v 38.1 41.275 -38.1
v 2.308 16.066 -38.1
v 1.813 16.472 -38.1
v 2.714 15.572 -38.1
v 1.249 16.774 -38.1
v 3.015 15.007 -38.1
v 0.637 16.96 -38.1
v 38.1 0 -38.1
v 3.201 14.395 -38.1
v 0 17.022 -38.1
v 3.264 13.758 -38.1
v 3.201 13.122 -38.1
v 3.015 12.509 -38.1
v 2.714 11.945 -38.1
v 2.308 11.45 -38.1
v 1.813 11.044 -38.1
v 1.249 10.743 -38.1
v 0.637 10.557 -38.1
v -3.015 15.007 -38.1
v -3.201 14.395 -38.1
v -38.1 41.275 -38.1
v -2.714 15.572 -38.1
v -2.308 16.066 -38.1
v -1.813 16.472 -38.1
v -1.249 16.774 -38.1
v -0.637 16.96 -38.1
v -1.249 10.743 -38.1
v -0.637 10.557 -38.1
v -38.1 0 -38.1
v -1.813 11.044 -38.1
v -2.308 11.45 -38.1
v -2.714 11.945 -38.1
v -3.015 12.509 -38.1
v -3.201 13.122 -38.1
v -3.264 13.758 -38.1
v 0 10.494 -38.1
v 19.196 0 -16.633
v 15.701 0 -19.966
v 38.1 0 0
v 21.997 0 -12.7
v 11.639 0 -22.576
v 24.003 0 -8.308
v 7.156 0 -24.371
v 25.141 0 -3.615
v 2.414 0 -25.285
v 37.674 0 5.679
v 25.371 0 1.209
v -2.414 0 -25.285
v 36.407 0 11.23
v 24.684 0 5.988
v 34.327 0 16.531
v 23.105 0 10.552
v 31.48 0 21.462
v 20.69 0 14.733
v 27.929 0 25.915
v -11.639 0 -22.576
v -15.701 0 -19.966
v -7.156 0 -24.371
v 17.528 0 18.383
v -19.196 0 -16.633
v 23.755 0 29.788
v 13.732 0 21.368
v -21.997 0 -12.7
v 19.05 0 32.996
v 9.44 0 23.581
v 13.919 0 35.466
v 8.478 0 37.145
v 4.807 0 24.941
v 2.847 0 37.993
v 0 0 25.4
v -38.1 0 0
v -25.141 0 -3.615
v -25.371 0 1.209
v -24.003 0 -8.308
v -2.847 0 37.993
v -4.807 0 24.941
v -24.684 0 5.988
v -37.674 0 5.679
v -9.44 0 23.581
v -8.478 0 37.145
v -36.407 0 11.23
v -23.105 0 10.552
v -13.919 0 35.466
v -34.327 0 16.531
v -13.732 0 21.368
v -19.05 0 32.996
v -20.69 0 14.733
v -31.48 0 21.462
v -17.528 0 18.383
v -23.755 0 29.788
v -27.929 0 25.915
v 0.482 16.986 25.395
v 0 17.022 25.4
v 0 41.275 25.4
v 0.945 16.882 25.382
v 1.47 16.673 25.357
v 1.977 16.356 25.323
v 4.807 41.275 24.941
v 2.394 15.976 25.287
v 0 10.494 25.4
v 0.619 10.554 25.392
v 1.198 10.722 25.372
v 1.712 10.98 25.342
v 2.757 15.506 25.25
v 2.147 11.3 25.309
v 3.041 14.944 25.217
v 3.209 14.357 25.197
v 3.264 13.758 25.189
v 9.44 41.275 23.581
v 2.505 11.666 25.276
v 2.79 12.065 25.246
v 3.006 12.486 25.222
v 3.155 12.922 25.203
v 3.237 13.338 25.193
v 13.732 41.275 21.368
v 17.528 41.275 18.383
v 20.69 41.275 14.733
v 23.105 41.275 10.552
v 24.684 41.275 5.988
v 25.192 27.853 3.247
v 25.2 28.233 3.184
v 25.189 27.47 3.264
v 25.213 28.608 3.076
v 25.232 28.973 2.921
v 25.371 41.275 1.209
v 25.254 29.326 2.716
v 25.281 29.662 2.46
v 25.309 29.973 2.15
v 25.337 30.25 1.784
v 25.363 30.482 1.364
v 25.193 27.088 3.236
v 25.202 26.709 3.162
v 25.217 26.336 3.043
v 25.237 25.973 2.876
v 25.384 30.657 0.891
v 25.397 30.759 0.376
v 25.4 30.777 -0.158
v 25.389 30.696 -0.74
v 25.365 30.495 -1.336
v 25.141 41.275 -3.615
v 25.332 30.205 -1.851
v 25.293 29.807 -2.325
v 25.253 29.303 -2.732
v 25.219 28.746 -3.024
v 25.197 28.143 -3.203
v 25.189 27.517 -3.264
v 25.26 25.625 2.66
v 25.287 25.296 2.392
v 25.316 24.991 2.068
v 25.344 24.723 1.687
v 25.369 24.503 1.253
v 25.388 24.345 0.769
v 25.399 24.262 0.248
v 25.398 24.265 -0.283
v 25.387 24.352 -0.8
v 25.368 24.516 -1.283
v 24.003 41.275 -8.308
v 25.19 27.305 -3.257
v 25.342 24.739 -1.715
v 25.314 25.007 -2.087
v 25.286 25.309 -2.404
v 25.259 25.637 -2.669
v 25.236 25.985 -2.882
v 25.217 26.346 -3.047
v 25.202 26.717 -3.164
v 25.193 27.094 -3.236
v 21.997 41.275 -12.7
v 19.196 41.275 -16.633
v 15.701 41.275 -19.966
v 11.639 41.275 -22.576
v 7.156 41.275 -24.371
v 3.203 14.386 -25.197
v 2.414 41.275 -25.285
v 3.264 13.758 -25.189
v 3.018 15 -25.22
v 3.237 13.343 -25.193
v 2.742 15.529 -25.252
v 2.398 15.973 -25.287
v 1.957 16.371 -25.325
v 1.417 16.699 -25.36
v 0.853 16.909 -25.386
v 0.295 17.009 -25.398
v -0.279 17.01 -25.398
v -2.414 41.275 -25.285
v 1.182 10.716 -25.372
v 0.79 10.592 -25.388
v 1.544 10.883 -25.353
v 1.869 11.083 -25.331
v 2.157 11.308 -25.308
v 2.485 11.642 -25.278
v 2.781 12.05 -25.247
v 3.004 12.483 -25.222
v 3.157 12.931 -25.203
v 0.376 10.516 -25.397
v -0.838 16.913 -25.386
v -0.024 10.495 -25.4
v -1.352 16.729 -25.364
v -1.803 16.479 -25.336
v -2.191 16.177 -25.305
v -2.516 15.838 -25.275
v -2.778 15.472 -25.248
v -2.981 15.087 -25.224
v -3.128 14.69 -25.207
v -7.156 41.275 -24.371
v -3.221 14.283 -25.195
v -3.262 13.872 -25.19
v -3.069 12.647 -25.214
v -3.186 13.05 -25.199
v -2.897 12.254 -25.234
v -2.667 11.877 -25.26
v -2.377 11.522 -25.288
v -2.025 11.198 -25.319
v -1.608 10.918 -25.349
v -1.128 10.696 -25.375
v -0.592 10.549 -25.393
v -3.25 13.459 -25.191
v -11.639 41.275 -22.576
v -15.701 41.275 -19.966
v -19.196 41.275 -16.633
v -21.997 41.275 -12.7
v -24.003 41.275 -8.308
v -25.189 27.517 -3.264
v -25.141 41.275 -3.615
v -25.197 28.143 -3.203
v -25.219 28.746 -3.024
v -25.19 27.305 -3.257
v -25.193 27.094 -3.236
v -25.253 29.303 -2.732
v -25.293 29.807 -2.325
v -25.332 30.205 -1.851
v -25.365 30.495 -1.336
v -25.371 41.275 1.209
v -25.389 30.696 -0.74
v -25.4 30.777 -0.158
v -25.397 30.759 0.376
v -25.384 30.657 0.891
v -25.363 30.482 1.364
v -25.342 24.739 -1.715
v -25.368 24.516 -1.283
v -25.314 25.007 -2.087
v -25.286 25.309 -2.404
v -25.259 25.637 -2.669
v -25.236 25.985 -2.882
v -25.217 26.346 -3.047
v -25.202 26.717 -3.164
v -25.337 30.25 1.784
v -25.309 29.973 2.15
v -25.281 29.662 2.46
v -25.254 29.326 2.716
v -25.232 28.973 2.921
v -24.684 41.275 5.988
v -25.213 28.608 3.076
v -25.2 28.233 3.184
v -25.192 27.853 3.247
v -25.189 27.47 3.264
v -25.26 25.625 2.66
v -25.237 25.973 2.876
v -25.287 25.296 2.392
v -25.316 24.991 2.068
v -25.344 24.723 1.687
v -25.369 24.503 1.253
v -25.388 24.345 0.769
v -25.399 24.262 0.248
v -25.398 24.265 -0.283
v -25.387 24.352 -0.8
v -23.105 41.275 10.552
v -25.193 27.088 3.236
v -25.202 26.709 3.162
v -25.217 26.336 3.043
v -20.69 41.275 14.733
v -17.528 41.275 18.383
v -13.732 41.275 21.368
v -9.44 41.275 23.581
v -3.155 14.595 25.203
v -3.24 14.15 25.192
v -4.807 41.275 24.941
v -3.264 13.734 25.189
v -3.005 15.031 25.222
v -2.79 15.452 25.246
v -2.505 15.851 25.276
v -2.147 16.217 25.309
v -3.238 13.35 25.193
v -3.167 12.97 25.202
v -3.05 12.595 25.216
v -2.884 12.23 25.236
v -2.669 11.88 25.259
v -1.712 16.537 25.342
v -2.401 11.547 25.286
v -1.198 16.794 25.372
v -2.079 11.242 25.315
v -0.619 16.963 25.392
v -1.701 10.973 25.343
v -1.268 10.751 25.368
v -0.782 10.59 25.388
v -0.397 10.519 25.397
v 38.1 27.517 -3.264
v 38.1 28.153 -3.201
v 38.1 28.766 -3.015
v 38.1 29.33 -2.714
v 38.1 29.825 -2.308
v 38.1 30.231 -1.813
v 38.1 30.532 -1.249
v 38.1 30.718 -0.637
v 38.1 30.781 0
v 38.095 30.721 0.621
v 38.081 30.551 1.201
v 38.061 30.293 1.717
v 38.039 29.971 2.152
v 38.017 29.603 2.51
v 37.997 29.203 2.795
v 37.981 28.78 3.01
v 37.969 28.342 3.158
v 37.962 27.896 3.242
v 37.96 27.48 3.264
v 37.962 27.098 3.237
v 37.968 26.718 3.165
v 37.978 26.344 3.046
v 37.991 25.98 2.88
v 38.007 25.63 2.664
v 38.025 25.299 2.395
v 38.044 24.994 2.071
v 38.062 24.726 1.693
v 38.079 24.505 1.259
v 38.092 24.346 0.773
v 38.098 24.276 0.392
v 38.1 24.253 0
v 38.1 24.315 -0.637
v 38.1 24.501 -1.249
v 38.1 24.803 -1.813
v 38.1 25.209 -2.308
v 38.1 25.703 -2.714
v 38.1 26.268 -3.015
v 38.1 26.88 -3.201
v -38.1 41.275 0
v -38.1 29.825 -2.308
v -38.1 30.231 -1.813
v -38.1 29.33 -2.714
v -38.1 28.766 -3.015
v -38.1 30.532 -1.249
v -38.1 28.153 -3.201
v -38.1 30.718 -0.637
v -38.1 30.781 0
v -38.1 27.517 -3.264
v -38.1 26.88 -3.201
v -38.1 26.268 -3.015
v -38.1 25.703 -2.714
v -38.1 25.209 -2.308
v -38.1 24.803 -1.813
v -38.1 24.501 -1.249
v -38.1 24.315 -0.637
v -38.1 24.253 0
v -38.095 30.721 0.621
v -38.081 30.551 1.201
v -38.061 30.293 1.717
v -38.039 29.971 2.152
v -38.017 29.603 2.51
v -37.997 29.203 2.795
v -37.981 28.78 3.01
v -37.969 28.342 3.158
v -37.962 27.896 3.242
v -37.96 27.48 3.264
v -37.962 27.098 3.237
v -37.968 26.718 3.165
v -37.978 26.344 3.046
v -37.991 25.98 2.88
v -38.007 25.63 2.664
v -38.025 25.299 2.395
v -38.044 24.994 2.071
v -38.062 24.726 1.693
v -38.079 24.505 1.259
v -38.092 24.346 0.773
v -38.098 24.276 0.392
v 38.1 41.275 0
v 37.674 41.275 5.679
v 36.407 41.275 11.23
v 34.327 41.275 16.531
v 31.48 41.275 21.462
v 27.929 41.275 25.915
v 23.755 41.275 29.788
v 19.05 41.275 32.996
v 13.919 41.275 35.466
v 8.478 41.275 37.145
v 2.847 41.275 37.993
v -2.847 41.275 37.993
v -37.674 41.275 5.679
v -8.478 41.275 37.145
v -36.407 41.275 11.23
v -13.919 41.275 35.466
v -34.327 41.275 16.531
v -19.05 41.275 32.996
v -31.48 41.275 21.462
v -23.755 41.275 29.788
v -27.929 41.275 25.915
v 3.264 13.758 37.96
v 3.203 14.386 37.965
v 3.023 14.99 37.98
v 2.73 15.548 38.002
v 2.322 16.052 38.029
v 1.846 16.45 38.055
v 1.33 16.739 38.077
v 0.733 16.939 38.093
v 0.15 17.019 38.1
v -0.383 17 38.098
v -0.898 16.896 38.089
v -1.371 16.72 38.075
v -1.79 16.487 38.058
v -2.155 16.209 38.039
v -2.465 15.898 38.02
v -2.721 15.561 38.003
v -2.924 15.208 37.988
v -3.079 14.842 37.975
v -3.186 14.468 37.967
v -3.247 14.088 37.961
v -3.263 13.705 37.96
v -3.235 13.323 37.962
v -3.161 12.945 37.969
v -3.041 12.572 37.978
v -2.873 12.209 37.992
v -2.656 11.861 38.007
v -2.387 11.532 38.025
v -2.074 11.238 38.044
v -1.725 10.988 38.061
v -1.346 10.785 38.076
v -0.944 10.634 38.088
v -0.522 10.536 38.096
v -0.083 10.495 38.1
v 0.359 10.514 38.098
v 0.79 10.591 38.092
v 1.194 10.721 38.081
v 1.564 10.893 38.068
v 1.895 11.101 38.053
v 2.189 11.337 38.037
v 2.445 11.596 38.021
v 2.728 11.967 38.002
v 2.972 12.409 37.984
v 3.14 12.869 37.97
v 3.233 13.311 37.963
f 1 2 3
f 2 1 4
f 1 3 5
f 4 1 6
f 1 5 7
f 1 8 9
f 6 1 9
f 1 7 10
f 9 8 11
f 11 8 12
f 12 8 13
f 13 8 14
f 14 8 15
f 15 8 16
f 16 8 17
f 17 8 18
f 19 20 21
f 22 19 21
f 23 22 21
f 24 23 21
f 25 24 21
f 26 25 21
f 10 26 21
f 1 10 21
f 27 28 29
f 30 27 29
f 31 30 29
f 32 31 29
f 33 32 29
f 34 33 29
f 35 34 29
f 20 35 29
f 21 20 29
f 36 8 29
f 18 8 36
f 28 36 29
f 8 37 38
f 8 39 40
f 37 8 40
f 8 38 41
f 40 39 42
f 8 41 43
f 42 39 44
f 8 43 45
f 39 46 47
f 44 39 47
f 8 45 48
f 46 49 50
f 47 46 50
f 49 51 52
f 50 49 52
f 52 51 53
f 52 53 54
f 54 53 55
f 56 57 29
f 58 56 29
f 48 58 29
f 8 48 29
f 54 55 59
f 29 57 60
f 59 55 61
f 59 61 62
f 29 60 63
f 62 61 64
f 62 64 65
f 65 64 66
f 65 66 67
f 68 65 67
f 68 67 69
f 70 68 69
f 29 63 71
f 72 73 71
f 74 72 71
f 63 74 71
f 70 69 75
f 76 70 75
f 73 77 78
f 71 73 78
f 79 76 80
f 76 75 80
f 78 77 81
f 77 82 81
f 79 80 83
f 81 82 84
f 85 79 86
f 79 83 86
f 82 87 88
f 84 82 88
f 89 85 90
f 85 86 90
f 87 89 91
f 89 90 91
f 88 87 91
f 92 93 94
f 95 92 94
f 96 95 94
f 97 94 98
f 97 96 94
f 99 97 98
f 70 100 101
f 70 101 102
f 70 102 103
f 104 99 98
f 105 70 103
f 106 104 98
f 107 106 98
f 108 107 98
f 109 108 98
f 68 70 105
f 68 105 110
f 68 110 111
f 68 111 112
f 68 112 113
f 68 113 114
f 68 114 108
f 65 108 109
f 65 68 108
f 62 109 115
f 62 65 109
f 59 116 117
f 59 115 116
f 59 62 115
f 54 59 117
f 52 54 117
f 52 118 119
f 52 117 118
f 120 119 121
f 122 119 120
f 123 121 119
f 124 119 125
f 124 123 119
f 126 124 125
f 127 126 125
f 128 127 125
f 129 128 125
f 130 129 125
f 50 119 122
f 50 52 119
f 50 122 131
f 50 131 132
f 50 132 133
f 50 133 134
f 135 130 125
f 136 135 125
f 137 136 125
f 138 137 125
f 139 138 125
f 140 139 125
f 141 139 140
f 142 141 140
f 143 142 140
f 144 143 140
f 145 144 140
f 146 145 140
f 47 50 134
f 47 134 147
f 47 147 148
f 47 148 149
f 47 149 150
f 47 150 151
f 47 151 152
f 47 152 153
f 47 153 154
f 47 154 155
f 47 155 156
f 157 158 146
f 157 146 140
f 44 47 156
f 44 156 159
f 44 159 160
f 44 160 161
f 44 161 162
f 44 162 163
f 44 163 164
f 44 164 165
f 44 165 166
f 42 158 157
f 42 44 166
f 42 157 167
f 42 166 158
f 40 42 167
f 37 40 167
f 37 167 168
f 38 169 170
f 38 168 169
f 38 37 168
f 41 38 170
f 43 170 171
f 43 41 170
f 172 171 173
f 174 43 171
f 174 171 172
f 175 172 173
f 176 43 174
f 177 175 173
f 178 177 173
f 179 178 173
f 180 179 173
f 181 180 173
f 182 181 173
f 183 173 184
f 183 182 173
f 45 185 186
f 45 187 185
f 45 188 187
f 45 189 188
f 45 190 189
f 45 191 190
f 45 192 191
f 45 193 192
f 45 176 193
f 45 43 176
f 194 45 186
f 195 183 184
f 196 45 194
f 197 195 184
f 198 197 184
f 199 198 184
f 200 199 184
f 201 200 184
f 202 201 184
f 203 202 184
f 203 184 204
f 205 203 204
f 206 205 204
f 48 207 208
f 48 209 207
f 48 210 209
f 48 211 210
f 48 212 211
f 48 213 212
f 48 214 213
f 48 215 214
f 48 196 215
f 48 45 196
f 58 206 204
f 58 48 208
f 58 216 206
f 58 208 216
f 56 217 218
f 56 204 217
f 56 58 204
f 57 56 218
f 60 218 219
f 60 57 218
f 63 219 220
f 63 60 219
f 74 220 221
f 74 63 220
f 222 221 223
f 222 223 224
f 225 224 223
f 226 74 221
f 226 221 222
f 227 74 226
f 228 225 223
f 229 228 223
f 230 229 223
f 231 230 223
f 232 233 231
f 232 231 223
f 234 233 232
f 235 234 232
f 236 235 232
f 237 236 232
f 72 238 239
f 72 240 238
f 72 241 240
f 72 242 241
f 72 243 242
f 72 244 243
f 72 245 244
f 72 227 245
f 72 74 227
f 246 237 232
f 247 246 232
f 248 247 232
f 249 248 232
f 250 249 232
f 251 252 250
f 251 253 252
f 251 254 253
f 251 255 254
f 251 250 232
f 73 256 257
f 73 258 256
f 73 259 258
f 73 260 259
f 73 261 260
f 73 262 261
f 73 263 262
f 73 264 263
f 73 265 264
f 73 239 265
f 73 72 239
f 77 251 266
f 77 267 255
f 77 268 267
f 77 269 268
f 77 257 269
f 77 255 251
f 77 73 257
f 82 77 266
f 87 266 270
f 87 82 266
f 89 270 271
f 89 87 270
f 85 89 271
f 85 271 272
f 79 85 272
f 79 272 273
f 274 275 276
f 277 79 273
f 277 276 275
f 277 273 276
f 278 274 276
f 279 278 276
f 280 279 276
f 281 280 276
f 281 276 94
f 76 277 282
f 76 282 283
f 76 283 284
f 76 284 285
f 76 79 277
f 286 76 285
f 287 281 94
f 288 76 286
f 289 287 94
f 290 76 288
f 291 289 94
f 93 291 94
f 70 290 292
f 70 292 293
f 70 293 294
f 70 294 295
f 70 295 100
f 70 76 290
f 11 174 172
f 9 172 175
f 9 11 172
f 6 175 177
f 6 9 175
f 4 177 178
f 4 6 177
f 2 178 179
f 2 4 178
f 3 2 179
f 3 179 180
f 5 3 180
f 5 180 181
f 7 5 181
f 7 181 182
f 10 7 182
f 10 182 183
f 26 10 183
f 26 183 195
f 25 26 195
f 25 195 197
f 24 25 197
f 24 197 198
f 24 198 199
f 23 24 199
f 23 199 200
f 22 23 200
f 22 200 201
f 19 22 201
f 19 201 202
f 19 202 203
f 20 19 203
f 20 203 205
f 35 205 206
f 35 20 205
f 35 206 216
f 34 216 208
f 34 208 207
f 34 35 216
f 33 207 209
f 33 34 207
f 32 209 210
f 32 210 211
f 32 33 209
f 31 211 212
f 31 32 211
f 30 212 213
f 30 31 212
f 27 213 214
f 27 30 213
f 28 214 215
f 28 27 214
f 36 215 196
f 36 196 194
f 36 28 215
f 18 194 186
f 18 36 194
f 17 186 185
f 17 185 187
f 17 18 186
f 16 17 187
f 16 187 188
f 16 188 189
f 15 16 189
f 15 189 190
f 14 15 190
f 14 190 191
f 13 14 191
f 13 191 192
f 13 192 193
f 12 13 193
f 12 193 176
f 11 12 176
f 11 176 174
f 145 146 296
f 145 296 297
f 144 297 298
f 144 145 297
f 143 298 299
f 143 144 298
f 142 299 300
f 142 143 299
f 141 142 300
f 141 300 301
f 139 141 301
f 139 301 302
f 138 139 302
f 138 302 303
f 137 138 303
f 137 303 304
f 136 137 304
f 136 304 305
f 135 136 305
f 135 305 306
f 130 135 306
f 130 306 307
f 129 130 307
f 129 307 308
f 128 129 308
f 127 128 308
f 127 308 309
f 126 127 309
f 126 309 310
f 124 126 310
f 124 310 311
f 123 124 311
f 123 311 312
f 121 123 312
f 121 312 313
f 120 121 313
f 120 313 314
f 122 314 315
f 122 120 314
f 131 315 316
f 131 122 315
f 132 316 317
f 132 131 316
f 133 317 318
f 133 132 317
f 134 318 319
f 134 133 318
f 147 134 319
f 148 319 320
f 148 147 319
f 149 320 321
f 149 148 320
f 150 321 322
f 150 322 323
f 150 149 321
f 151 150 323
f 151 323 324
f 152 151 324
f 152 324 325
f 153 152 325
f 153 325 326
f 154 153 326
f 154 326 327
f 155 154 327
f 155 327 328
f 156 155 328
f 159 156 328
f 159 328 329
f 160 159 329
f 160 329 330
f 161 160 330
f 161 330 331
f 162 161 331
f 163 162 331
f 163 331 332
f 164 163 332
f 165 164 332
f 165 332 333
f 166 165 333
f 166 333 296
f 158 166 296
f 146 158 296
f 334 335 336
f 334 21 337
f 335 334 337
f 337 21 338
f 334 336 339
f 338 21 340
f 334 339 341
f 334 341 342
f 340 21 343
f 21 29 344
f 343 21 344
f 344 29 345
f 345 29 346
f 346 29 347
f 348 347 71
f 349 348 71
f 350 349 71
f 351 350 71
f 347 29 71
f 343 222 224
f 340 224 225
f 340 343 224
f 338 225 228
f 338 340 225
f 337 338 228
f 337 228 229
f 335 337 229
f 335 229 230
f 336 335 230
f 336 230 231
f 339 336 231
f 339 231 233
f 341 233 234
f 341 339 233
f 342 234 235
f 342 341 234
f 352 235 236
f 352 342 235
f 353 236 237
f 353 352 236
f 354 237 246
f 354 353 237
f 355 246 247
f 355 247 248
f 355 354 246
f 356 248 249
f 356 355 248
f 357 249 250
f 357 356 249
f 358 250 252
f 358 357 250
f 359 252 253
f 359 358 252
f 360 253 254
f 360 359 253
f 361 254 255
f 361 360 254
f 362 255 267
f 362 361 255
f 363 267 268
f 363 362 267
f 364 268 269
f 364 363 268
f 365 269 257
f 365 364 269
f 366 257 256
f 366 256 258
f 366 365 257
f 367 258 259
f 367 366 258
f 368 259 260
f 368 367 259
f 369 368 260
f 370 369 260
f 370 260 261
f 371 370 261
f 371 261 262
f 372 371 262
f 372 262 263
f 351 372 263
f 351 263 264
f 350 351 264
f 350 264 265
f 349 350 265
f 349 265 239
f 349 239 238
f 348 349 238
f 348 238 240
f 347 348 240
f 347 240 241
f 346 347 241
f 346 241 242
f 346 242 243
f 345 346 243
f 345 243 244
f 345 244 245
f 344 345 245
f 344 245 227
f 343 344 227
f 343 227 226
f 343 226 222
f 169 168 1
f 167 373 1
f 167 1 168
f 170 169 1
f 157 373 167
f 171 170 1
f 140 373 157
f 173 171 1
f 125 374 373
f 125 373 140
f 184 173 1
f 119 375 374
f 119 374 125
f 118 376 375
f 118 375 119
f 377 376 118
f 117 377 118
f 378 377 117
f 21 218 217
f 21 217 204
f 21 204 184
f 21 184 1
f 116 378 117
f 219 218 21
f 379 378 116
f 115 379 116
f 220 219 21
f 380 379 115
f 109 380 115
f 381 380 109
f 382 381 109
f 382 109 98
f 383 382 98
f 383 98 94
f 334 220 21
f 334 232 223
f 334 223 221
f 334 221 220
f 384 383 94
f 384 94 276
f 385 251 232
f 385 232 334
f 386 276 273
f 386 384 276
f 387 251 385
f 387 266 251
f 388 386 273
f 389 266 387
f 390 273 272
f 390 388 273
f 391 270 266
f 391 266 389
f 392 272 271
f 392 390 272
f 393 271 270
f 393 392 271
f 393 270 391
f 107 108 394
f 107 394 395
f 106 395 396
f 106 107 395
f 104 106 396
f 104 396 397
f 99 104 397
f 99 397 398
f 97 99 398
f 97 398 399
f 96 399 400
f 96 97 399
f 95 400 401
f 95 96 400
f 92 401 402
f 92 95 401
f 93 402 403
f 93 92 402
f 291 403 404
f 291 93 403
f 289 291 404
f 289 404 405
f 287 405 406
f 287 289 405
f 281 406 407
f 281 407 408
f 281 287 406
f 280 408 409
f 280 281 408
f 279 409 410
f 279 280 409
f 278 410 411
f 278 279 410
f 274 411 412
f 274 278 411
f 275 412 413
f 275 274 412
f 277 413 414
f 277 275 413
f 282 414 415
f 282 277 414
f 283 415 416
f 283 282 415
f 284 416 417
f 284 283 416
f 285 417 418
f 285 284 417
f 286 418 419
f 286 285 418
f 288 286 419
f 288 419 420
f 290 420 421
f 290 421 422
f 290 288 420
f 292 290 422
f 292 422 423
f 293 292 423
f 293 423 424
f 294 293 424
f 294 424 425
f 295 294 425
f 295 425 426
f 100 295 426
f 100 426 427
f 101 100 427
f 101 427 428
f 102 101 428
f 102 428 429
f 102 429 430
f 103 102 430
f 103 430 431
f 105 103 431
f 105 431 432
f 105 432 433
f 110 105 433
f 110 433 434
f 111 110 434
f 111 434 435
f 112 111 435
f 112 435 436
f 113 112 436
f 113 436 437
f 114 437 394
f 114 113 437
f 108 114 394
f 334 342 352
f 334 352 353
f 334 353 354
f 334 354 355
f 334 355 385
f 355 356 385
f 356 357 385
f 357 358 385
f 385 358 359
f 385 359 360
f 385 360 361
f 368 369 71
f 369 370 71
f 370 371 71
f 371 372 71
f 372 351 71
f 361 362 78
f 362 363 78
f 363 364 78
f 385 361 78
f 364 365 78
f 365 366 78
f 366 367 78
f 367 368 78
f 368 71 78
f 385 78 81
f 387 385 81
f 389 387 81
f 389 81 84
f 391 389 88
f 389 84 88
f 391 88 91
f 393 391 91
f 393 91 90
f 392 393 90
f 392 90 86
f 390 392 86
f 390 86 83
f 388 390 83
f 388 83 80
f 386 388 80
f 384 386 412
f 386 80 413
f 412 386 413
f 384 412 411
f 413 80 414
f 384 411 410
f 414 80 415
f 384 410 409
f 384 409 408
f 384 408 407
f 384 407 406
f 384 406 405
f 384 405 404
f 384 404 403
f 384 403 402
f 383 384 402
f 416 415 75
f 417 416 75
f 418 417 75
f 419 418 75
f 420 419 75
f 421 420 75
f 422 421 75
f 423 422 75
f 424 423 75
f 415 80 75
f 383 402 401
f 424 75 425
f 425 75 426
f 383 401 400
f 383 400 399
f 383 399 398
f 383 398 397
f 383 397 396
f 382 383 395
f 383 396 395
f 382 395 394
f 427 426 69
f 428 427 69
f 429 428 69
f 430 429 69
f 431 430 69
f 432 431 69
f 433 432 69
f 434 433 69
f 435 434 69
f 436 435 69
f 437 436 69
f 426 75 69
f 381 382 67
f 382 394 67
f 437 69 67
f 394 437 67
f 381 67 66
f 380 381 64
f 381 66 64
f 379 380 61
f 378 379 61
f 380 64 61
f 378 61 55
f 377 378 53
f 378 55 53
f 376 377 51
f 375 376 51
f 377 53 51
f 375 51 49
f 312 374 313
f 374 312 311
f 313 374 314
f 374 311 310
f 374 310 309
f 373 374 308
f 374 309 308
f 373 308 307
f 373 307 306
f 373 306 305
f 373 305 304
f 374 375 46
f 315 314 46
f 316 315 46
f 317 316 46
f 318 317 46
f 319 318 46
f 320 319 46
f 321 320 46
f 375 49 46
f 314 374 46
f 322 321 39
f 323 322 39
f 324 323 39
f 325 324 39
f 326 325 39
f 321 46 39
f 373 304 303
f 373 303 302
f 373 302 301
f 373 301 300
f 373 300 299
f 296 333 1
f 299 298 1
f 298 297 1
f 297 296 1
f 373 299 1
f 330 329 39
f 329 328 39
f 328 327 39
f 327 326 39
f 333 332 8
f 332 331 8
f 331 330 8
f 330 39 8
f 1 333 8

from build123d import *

# Parameters (mm, degrees)
BOSS_EXTRUDE1_DEPTH     = 41.275
CUT_EXTRUDE1_DEPTH      = 68.873747686
CUT_EXTRUDE1_DEPTH_BACK = 68.873747686
SKETCH2_R               = 25.4
CUT_EXTRUDE2_DEPTH      = 68.873747686
CUT_EXTRUDE2_DEPTH_BACK = 68.873747686
SKETCH3_R               = 3.2639
CUT_EXTRUDE3_DEPTH      = 68.87374786
CUT_EXTRUDE3_DEPTH_BACK = 68.87374786
SKETCH4_R               = 3.2639


with BuildPart() as part:
    # Sketch1 → Boss-Extrude1 (new body)
    with BuildSketch(Plane(origin=(0, 0, 0), x_dir=(-1, 0, 0), z_dir=(0, 1, 0))):
        with BuildLine():
            Line((-38.1, 0), (-38.1, -38.1))
            Line((-38.1, -38.1), (38.1, -38.1))
            Line((38.1, -38.1), (38.1, 0))
            ThreePointArc((38.1, 0), (0, 38.1), (-38.1, 0))
        make_face()
    extrude(amount=BOSS_EXTRUDE1_DEPTH)

    # Sketch2 → Cut-Extrude1 (cut, two sides: drawn at the far end of the back side and taken through both)
    with BuildSketch(Plane(origin=(0, 41.275, 0), x_dir=(-1, 0, 0), z_dir=(0, 1, 0)).offset(-CUT_EXTRUDE1_DEPTH_BACK)):
        with Locations(Location((0, 0, 0), (0, 0, 90))):
            Circle(SKETCH2_R)
    extrude(amount=CUT_EXTRUDE1_DEPTH + CUT_EXTRUDE1_DEPTH_BACK, mode=Mode.SUBTRACT)

    # Sketch3 → Cut-Extrude2 (cut, two sides: drawn at the far end of the back side and taken through both)
    with BuildSketch(Plane(origin=(0, 0, 0), x_dir=(0, 1, 0), z_dir=(0, 0, 1)).offset(-CUT_EXTRUDE2_DEPTH_BACK)):
        with Locations(Location((13.758333333, 0, 0), (0, 0, 270))):
            Circle(SKETCH3_R)
    extrude(amount=CUT_EXTRUDE2_DEPTH + CUT_EXTRUDE2_DEPTH_BACK, mode=Mode.SUBTRACT)

    # Sketch4 → Cut-Extrude3 (cut, two sides: drawn at the far end of the back side and taken through both)
    with BuildSketch(Plane.YZ.offset(-CUT_EXTRUDE3_DEPTH_BACK)):
        with Locations(Location((27.516666667, 0, 0), (0, 0, 270))):
            Circle(SKETCH4_R)
    extrude(amount=CUT_EXTRUDE3_DEPTH + CUT_EXTRUDE3_DEPTH_BACK, mode=Mode.SUBTRACT)


solid = part.part
